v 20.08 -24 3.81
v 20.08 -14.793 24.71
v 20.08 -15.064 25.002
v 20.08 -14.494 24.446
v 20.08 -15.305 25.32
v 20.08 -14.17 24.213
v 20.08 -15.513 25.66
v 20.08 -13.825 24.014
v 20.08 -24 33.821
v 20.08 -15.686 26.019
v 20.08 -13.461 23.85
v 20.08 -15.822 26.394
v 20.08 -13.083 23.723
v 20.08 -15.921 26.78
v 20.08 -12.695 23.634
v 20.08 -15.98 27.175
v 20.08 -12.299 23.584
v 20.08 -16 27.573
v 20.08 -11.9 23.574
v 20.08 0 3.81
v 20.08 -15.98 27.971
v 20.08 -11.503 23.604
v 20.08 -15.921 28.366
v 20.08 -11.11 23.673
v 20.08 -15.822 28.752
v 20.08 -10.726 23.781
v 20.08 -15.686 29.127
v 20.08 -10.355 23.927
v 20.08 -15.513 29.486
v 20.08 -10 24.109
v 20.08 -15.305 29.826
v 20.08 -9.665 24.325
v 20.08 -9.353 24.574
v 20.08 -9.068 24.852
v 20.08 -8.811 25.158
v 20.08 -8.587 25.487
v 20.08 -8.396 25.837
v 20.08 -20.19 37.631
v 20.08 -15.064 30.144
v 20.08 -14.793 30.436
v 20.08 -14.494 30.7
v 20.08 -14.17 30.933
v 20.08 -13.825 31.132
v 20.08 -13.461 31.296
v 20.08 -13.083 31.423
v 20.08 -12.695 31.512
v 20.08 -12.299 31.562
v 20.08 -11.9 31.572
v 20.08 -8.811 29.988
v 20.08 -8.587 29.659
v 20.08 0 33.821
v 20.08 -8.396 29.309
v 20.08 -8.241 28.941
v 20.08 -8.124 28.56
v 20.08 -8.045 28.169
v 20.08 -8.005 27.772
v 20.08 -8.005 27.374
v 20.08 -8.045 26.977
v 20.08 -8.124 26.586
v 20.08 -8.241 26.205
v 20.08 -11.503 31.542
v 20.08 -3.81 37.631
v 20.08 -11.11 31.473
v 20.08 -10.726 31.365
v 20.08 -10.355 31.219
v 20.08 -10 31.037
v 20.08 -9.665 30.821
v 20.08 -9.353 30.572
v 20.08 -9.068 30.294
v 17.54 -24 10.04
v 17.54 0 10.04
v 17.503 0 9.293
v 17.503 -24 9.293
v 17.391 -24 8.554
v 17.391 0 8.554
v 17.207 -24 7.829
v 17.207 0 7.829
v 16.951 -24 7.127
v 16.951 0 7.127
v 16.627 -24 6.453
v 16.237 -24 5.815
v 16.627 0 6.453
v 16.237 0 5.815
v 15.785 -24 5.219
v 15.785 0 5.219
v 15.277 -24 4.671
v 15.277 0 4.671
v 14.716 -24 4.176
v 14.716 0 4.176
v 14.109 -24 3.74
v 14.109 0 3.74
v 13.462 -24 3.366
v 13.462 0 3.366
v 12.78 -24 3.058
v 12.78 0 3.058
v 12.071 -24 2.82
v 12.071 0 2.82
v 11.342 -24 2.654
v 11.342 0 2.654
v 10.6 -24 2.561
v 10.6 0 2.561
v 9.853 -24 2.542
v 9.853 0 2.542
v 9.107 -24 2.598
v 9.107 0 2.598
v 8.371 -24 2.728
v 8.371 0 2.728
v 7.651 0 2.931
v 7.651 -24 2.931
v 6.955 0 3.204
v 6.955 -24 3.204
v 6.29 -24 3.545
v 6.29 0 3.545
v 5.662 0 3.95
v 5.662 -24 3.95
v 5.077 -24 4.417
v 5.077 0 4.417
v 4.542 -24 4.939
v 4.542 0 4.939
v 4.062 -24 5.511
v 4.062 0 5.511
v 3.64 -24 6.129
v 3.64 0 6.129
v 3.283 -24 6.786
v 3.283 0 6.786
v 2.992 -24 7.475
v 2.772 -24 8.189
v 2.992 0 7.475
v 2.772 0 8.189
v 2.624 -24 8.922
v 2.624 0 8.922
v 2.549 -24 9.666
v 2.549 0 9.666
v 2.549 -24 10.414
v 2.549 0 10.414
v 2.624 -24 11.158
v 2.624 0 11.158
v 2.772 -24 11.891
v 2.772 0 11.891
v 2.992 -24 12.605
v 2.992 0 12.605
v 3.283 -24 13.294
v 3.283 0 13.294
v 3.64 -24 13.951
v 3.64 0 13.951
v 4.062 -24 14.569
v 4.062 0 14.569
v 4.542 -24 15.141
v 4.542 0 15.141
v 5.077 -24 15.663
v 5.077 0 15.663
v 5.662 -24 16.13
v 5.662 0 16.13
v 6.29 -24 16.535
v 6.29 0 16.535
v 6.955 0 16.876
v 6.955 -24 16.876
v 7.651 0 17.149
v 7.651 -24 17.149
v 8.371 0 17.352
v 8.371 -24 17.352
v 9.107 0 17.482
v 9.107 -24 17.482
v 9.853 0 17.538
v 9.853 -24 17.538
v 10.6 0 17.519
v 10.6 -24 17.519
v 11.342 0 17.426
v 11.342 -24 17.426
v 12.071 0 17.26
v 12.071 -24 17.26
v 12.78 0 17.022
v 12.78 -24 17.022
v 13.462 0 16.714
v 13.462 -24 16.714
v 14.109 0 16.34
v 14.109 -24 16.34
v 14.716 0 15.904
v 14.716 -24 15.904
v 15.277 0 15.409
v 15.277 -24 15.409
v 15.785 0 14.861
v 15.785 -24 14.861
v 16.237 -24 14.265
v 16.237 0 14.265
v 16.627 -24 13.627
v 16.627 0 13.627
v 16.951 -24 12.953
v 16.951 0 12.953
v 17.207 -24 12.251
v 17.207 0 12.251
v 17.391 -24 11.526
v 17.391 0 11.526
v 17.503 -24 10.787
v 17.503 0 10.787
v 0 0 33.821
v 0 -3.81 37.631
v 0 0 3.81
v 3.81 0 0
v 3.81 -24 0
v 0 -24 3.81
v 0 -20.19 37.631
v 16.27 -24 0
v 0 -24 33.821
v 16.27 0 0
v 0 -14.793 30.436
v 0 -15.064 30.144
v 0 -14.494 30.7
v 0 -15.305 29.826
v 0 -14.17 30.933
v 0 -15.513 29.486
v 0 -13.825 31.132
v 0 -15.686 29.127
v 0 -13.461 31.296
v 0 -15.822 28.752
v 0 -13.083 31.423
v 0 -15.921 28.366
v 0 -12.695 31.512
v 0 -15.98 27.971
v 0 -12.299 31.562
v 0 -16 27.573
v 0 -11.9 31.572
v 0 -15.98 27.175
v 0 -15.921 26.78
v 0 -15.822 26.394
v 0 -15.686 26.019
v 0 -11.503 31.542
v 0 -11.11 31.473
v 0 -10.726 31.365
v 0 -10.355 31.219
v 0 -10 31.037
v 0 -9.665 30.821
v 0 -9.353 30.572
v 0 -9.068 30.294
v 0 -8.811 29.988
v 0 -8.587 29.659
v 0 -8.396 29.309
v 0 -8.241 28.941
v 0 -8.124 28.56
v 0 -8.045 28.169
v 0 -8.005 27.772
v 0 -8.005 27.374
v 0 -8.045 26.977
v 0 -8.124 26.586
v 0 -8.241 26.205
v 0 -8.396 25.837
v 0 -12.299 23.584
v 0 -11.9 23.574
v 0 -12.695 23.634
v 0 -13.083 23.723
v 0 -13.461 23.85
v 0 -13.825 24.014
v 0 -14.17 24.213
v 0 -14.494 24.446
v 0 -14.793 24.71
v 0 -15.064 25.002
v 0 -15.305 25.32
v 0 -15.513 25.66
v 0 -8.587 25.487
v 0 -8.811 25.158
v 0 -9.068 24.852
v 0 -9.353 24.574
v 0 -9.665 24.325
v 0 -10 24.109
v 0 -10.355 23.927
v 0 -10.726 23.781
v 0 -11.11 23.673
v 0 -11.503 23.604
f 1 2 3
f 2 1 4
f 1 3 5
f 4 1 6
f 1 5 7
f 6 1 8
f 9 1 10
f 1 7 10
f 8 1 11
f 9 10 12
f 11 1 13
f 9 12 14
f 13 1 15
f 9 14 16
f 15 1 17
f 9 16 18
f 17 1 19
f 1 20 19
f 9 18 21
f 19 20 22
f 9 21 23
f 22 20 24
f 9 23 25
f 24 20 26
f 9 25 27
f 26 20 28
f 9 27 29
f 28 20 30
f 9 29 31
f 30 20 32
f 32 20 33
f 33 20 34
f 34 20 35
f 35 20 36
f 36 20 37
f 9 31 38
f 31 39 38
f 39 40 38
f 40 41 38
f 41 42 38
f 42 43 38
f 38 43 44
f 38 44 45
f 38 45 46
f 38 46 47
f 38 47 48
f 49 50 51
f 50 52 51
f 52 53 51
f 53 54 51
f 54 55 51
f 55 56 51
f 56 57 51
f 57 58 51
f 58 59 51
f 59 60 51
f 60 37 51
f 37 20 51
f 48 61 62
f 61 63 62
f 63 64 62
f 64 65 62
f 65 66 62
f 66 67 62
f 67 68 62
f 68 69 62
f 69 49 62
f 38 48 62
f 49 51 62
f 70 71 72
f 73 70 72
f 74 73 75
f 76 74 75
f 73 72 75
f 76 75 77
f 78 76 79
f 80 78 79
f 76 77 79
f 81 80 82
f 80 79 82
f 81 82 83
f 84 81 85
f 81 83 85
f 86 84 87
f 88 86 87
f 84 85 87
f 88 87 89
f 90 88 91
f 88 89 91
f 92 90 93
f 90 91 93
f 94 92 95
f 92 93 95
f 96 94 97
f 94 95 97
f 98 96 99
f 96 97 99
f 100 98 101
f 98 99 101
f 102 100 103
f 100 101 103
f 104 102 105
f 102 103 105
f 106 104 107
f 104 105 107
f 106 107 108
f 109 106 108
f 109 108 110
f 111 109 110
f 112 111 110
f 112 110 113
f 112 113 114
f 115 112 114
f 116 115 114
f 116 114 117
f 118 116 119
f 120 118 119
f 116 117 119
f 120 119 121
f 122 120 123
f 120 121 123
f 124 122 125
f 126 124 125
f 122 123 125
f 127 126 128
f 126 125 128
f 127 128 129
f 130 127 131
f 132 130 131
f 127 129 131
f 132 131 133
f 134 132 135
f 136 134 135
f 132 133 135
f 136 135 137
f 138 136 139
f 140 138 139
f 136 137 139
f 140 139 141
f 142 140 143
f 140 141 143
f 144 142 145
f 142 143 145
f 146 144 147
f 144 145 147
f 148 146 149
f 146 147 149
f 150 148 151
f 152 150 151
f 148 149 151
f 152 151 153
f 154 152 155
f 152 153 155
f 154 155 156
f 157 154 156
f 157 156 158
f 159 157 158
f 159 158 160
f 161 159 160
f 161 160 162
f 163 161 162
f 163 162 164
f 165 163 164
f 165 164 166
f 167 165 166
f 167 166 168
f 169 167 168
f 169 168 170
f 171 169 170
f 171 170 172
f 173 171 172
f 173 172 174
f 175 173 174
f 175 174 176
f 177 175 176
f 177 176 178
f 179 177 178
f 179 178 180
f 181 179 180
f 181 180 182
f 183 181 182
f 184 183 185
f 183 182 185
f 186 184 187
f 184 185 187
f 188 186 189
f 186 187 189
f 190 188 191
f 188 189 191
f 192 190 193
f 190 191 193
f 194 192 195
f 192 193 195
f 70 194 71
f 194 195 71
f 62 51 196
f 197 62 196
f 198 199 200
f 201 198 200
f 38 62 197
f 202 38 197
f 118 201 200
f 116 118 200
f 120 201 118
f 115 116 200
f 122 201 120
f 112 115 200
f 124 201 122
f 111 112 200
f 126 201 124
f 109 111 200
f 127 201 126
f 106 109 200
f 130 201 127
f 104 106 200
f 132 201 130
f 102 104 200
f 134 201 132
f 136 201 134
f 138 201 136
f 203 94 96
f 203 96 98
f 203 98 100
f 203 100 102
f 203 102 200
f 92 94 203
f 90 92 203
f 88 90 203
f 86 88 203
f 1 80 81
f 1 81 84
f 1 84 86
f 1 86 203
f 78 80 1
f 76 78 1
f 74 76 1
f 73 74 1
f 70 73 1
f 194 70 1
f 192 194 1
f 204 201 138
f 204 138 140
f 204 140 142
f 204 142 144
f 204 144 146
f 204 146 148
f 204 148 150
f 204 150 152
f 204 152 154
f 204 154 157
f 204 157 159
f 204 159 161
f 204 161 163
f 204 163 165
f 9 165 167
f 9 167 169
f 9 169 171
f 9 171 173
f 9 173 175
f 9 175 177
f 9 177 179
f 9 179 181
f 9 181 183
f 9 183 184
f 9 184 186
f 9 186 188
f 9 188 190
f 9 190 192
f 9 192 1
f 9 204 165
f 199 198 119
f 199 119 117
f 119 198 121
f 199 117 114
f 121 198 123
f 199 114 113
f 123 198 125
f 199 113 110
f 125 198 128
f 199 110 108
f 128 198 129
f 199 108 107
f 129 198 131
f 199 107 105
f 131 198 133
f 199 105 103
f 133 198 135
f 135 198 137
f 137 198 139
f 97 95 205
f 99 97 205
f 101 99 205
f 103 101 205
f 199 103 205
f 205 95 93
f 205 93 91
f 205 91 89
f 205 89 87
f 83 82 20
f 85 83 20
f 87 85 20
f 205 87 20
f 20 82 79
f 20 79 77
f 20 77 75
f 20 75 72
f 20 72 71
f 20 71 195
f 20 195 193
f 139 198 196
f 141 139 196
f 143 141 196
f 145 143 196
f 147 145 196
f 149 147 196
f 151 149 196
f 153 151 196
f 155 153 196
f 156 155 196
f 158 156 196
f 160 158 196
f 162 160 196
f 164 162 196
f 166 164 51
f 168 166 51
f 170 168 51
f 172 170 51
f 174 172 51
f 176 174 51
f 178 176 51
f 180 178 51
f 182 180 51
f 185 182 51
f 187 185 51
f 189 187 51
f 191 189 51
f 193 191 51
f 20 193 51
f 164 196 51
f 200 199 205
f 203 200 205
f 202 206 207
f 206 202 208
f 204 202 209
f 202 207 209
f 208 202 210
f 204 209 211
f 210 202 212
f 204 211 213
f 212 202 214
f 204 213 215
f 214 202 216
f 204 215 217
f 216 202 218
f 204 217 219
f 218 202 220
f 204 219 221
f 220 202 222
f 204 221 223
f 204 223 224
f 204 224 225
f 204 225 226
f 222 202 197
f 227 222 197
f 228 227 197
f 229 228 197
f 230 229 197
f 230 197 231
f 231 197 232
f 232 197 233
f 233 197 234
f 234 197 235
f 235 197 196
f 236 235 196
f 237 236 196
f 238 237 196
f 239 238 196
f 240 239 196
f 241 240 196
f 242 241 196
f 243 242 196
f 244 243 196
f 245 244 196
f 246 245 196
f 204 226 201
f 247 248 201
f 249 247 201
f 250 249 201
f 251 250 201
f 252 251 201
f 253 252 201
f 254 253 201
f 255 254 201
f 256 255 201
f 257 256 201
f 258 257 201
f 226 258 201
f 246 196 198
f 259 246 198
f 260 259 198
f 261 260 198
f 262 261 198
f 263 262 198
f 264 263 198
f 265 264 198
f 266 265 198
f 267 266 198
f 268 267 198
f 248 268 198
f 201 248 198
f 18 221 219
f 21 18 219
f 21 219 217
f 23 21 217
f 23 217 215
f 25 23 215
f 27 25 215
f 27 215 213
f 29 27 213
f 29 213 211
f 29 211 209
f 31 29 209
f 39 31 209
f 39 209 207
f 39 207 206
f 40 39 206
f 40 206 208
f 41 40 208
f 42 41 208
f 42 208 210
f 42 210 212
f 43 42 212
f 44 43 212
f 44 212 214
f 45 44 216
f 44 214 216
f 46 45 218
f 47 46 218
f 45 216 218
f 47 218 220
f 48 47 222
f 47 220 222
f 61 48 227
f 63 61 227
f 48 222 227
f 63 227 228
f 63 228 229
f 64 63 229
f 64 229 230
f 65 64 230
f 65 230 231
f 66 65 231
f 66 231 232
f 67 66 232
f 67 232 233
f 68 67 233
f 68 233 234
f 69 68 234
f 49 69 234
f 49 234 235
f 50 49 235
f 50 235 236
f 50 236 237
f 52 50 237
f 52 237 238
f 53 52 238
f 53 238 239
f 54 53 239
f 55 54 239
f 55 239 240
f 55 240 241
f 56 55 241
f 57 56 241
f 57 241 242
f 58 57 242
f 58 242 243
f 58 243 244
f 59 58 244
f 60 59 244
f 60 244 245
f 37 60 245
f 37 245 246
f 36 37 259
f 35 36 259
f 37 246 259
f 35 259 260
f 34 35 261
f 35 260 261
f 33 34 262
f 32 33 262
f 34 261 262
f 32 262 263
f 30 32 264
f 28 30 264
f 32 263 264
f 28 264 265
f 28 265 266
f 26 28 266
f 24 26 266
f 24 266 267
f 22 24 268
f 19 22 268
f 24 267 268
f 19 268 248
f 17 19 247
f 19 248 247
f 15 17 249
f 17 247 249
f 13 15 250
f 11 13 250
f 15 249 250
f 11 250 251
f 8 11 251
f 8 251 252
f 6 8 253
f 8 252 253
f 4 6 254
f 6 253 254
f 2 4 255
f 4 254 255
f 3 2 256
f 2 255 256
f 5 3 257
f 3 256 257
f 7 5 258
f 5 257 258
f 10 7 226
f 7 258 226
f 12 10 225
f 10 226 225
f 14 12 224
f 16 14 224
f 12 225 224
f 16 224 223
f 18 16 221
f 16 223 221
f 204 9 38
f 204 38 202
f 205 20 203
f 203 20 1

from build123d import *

# Parameters (mm, degrees)
F1_DEPTH = 24
F2_R     = 4
F3_DEPTH = 25.4
F4_SIZE  = 3.81


with BuildPart() as f1:
    # F0 (on Front) → F1 (new body)
    with BuildSketch(Plane.XZ):
        with BuildLine():
            Line((0, 37.6314), (0, 0))
            Line((0, 0), (10.04, 0))
            Line((10.04, 0), (10.04, 2.54))
            ThreePointArc((10.04, 2.54), (2.54, 10.04), (10.04, 17.54))
            ThreePointArc((10.04, 17.54), (15.3433008589, 15.3433008589), (17.54, 10.04))
            Line((17.54, 10.04), (20.08, 10.04))
            Line((20.08, 10.04), (20.08, 37.6314))
            Line((20.08, 37.6314), (0, 37.6314))
        make_face()
        with BuildLine():
            ThreePointArc((17.5457, 27.5857), (15.3473313676, 22.2783686324), (10.04, 20.08))
            ThreePointArc((10.04, 20.08), (4.7326686324, 32.8930313676), (17.5457, 27.5857))
        make_face(mode=Mode.SUBTRACT)
        with BuildLine():
            ThreePointArc((17.5457, 27.5857), (4.7326686324, 32.8930313676), (10.04, 20.08))
            ThreePointArc((10.04, 20.08), (15.3473313676, 22.2783686324), (17.5457, 27.5857))
        make_face()
        with BuildLine():
            ThreePointArc((14.04, 27.5857), (12.8684271247, 24.7572728753), (10.04, 23.5857))
            ThreePointArc((10.04, 23.5857), (7.2115728753, 30.4141271247), (14.04, 27.5857))
        make_face(mode=Mode.SUBTRACT)
        with BuildLine():
            Line((10.04, 2.54), (10.04, 0))
            Line((10.04, 0), (20.08, 0))
            Line((20.08, 0), (20.08, 10.04))
            Line((20.08, 10.04), (17.54, 10.04))
            ThreePointArc((17.54, 10.04), (15.3433008589, 4.7366991411), (10.04, 2.54))
        make_face()
        with BuildLine():
            ThreePointArc((14.04, 27.5857), (7.2115728753, 30.4141271247), (10.04, 23.5857))
            ThreePointArc((10.04, 23.5857), (12.8684271247, 24.7572728753), (14.04, 27.5857))
        make_face()
    extrude(amount=F1_DEPTH)

    # F2 (on face) → F3 (cut)
    with BuildSketch(Plane(origin=(0, 0, 0), x_dir=(0, -1, 0), z_dir=(-1, 0, 0))):
        with Locations((12, 27.573)):
            Circle(F2_R)
    extrude(amount=-F3_DEPTH, mode=Mode.SUBTRACT)

    # F4
    f4_edges = [f1.edges().sort_by_distance(p)[0] for p in [
        (10.04, 0, 37.6314),
        (0, -12, 0),
        (10.04, -24, 37.6314),
        (20.08, -12, 0),
    ]]
    chamfer(f4_edges, length=F4_SIZE)


solid = f1.part
